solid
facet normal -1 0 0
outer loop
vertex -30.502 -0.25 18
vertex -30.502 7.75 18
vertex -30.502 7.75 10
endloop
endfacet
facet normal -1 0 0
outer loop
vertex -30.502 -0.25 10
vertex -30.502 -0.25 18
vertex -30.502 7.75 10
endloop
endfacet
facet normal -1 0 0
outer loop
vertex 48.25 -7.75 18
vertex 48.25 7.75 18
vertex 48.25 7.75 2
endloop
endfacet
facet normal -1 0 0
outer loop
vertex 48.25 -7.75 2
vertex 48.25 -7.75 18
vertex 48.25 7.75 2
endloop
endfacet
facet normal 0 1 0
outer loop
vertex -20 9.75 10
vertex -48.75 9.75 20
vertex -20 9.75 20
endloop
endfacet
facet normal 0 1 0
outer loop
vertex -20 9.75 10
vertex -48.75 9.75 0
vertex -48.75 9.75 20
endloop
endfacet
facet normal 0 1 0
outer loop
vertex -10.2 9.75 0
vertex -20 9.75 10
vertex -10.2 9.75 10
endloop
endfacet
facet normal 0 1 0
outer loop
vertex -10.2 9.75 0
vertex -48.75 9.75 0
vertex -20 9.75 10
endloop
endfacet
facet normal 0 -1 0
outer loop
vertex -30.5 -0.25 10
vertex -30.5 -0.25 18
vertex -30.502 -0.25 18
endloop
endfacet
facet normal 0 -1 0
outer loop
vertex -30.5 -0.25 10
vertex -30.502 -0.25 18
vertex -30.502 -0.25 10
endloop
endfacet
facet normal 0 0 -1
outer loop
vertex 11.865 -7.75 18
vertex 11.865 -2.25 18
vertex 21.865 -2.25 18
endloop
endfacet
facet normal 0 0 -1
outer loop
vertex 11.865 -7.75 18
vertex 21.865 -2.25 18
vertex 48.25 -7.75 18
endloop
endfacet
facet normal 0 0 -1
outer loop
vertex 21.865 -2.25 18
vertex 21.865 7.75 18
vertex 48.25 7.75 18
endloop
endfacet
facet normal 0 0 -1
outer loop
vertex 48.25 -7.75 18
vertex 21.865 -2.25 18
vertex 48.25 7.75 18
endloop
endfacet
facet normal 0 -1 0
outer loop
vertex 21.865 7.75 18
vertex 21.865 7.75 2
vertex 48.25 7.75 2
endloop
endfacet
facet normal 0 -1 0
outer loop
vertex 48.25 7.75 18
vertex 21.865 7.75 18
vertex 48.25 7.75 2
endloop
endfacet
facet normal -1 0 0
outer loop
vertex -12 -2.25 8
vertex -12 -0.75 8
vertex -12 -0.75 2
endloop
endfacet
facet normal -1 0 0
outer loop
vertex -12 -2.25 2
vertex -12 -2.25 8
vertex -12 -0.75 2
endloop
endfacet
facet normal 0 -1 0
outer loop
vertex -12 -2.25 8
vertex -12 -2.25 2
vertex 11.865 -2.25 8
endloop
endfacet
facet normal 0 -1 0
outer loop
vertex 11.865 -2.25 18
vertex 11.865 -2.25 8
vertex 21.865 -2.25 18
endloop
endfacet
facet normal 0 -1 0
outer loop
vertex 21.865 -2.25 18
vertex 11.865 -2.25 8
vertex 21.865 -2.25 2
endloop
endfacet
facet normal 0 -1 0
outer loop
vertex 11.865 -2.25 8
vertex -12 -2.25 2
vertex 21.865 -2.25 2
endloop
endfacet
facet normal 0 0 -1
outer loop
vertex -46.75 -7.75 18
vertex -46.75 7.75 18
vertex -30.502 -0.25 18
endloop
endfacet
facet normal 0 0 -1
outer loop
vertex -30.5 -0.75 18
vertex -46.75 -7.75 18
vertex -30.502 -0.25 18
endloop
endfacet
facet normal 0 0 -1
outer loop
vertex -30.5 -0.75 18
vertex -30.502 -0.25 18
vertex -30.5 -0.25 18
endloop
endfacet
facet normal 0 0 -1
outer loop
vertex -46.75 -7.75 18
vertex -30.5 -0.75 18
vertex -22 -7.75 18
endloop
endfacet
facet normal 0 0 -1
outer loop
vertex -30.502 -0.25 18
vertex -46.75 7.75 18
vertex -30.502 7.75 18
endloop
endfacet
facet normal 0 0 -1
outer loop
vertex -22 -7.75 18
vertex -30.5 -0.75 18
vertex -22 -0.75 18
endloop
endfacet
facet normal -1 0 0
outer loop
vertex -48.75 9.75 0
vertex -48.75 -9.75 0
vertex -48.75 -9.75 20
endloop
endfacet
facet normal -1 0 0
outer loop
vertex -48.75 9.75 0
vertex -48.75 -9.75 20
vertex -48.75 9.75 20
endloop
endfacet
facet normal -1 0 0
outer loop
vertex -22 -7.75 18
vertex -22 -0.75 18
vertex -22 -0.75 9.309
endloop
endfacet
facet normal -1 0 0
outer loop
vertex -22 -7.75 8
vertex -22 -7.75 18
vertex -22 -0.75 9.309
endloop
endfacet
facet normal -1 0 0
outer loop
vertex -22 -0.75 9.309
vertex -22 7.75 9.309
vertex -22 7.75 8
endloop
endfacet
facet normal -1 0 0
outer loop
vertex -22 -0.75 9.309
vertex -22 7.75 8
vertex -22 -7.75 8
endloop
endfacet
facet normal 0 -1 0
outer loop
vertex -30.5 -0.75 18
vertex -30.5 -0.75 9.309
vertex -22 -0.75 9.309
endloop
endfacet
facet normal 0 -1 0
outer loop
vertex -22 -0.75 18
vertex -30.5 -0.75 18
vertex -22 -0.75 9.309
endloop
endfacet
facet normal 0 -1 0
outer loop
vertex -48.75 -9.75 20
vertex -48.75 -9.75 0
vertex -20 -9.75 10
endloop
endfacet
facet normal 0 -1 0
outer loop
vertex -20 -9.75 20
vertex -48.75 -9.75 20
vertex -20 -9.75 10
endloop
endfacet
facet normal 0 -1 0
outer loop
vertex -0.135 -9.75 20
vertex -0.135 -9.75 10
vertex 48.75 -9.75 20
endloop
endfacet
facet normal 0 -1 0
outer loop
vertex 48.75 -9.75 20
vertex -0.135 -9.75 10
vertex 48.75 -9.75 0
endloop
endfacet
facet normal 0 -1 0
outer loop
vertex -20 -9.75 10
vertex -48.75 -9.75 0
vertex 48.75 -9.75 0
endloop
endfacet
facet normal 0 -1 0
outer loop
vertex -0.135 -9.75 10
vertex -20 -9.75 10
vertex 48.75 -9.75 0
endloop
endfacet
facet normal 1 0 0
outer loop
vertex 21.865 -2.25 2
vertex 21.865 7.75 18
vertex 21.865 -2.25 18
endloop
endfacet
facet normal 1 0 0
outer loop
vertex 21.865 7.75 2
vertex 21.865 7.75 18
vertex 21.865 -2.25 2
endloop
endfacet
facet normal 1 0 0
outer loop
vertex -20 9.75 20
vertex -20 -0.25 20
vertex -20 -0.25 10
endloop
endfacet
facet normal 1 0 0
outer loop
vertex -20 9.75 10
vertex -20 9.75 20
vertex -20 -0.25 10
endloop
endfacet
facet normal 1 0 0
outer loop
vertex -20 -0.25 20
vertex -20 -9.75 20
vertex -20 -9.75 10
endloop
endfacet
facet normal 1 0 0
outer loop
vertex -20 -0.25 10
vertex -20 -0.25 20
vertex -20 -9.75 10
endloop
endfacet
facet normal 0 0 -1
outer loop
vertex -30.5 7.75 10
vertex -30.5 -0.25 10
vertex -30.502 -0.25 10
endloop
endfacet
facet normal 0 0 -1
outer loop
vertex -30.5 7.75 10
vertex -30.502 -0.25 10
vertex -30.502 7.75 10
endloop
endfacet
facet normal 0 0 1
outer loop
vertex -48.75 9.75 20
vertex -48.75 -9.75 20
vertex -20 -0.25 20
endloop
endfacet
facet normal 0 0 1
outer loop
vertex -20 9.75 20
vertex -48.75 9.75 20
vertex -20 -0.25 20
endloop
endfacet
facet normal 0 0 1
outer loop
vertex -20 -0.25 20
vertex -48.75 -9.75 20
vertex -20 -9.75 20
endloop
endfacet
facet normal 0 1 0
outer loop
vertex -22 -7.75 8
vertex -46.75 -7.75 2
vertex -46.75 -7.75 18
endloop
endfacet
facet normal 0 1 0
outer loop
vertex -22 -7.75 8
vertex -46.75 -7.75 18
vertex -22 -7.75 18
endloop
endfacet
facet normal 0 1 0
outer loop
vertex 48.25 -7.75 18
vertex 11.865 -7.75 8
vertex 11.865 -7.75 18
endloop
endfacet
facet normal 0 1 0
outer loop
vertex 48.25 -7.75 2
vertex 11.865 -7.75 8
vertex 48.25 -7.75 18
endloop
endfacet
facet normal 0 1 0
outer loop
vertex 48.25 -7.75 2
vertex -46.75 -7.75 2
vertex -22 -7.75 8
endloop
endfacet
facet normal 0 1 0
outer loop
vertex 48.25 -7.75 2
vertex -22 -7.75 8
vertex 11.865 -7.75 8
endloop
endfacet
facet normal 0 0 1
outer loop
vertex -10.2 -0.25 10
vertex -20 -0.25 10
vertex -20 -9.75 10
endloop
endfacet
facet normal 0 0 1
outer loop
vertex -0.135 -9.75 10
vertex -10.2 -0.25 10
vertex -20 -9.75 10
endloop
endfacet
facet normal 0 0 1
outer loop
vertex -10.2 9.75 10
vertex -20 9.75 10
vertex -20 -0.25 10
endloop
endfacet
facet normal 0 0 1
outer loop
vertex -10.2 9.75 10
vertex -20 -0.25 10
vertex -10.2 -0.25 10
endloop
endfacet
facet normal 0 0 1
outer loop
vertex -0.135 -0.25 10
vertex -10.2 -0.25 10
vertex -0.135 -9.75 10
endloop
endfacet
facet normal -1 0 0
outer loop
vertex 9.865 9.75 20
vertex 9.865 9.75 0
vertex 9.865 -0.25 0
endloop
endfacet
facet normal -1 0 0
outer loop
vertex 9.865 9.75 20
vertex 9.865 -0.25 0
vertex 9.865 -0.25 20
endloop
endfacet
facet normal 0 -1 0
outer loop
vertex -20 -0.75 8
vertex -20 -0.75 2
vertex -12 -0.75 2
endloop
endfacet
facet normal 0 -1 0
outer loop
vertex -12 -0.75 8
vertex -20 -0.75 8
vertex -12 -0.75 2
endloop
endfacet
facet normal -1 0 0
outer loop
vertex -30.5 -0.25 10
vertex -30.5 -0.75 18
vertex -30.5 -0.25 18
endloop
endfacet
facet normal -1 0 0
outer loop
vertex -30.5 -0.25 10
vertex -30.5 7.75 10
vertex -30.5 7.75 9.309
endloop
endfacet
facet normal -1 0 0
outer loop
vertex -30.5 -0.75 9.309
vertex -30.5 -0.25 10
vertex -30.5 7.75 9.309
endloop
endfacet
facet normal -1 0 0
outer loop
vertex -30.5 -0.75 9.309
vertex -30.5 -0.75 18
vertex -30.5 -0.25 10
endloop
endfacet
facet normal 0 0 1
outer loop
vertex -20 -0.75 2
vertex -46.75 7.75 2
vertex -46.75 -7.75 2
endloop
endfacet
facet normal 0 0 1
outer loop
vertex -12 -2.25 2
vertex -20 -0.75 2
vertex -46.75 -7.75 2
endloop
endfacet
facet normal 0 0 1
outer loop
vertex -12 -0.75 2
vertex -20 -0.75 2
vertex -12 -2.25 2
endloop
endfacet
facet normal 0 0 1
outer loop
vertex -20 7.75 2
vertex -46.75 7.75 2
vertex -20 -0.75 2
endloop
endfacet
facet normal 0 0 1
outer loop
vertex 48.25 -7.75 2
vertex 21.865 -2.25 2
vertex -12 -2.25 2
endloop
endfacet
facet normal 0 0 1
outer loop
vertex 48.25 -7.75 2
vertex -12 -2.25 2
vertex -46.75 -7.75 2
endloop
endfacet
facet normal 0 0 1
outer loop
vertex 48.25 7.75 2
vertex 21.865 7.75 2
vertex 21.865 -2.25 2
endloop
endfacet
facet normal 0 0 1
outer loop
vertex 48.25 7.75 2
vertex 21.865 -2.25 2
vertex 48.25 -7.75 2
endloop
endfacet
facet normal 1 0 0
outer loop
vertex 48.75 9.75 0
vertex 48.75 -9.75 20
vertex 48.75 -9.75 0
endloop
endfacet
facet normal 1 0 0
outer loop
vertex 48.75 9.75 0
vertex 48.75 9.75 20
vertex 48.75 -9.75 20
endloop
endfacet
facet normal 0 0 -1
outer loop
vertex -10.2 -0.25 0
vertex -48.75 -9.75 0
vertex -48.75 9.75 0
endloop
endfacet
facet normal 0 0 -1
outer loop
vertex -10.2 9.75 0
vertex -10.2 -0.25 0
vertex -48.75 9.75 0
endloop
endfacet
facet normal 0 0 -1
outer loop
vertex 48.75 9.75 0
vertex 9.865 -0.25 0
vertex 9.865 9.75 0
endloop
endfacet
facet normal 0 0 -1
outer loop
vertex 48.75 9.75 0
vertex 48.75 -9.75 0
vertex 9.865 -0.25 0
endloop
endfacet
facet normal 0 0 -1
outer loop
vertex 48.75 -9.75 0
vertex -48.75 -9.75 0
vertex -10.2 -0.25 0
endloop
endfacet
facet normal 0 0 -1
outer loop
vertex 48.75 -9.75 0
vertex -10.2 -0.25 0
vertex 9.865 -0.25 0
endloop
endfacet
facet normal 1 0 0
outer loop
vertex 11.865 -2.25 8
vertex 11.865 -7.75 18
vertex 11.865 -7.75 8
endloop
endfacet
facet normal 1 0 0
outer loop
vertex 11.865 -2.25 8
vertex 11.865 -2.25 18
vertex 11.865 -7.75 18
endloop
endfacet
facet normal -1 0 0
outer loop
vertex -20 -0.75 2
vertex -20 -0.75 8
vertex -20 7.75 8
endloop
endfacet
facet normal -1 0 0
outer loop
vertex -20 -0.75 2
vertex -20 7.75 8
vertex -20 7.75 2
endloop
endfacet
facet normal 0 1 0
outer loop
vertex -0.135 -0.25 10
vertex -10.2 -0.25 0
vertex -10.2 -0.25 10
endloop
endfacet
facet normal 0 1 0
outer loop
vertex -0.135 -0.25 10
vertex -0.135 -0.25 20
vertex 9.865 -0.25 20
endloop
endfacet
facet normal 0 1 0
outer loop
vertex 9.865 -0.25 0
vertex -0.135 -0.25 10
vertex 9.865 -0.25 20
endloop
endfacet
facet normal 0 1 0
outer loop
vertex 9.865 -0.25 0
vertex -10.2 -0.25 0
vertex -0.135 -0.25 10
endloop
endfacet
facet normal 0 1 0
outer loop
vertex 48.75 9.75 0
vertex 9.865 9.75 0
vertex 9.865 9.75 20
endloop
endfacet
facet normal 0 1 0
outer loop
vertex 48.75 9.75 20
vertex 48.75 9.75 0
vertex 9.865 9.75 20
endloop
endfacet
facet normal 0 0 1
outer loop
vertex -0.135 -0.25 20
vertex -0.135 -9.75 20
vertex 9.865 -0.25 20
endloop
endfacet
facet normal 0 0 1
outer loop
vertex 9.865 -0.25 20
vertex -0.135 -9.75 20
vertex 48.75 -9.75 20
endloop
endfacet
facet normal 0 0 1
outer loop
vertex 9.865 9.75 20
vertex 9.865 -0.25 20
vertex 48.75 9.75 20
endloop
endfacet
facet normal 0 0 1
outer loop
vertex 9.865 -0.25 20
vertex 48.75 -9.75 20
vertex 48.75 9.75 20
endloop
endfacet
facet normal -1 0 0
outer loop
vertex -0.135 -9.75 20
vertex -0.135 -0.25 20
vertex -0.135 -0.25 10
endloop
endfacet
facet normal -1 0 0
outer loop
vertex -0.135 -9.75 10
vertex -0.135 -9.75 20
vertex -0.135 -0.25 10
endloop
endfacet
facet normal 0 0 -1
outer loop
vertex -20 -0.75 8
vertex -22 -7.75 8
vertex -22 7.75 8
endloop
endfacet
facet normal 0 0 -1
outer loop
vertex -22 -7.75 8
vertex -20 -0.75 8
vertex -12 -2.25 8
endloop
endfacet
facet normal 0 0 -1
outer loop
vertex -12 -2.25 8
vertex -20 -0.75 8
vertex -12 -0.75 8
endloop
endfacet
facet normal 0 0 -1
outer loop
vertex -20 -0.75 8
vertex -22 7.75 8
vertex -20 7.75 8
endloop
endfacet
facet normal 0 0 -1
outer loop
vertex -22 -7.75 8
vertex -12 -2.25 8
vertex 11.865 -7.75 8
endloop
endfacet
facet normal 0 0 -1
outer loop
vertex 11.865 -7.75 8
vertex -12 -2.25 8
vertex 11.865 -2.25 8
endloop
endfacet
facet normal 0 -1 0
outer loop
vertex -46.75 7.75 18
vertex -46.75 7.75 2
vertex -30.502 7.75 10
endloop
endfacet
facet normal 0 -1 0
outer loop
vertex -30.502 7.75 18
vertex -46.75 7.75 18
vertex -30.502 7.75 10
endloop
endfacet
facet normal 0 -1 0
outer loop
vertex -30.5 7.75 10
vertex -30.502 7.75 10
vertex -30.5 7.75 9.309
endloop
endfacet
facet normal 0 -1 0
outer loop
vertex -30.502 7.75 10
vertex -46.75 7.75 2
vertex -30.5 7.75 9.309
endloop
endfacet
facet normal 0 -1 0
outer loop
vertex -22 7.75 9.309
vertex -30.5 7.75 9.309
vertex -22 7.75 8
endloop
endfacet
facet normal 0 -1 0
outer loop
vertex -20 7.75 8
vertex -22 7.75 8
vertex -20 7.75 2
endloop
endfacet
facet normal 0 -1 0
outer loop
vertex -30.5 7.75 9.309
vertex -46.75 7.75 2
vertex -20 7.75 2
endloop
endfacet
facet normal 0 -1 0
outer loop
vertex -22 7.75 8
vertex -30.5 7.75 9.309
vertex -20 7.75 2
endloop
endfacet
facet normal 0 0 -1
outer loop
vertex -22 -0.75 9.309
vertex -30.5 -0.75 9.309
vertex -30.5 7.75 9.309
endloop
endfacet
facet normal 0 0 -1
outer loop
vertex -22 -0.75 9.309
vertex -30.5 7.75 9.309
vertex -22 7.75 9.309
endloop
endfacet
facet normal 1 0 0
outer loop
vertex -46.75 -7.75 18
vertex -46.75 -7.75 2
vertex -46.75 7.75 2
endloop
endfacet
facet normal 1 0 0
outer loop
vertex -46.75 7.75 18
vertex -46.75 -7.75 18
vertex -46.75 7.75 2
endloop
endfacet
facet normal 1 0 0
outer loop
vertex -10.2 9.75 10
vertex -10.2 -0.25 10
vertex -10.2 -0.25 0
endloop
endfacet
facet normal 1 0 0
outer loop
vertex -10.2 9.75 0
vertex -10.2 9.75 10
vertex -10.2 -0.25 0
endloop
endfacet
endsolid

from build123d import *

# Parameters (mm, degrees)
SKETCH_1_W           = 97.5
SKETCH_1_H           = 19.5
EXTRUDE_1_DEPTH      = 20
SKETCH_2_W           = 29.8652771
SKETCH_2_H           = 10
CUT_EXTRUDE_4_DEPTH  = 29
SKETCH_3_W           = 10
SKETCH_3_H           = 10
CUT_EXTRUDE_5_DEPTH  = 10
SKETCH_4_W           = 19.8652771
SKETCH_4_H           = 10
CUT_EXTRUDE_6_DEPTH  = 10
SKETCH_5_W           = 10
SKETCH_5_H           = 10
CUT_EXTRUDE_7_DEPTH  = 10
SHELL_1_T            = -2
SKETCH_7_W           = 10
SKETCH_7_H           = 10
CUT_EXTRUDE_8_DEPTH  = 10
SKETCH_8_W           = 10.001998353
SKETCH_8_H           = 10
CUT_EXTRUDE_9_DEPTH  = 10
SKETCH_9_W           = 10
SKETCH_9_H           = 10
EXTRUDE_3_DEPTH      = 10
SKETCH_10_W          = 8.5
SKETCH_10_H          = 8.69149108
EXTRUDE_4_DEPTH      = 0.5
SKETCH_11_W          = 8
SKETCH_11_H          = 8
EXTRUDE_5_DEPTH      = 0.5
SKETCH_15_W          = 10.5
SKETCH_15_H          = 0.69149108
EXTRUDE_18_DEPTH     = 9.5
SKETCH_18_W          = 8
SKETCH_18_H          = 8
EXTRUDE_22_DEPTH     = 0.5
SKETCH_21_W          = 10
SKETCH_21_H          = 0.094242597
EXTRUDE_25_DEPTH     = 10.5
SKETCH_23_W          = 20
SKETCH_23_H          = 10
EXTRUDE_27_DEPTH     = 10
SKETCH_24_W          = 10.001998353
SKETCH_24_H          = 10
EXTRUDE_28_DEPTH     = 10
SKETCH_25_W          = 9.8
SKETCH_25_H          = 10
EXTRUDE_29_DEPTH     = 10
SKETCH_31_W          = 10
SKETCH_31_H          = 0.5
CUT_EXTRUDE_11_DEPTH = 11.5
SKETCH_32_W          = 16
SKETCH_32_H          = 15.5
EXTRUDE_43_DEPTH     = 0.5


with BuildPart() as part:
    # 草圖1 → 填料-伸長1 (new body)
    with BuildSketch(Plane.XY):
        Rectangle(SKETCH_1_W, SKETCH_1_H)
    extrude(amount=EXTRUDE_1_DEPTH)

    # 草圖2 → 除料-伸長4 (cut)
    with BuildSketch(Plane(origin=(0, 9.75, 0), x_dir=(1, 0, 0), z_dir=(0, 1, 0))):
        with Locations((-5.06736145, -15)):
            Rectangle(SKETCH_2_W, SKETCH_2_H)
    extrude(amount=-CUT_EXTRUDE_4_DEPTH, mode=Mode.SUBTRACT)

    # 草圖3 → 除料-伸長5 (cut)
    with BuildSketch(Plane(origin=(0, 9.75, 0), x_dir=(1, 0, 0), z_dir=(0, 1, 0))):
        with Locations((14.8652771, -15)):
            Rectangle(SKETCH_3_W, SKETCH_3_H)
    extrude(amount=-CUT_EXTRUDE_5_DEPTH, mode=Mode.SUBTRACT)

    # 草圖4 → 除料-伸長6 (cut)
    with BuildSketch(Plane(origin=(0, 9.75, 0), x_dir=(1, 0, 0), z_dir=(0, 1, 0))):
        with Locations((9.93263855, -5)):
            Rectangle(SKETCH_4_W, SKETCH_4_H)
    extrude(amount=-CUT_EXTRUDE_6_DEPTH, mode=Mode.SUBTRACT)

    # 草圖5 → 除料-伸長7 (cut)
    with BuildSketch(Plane(origin=(0, 9.75, 0), x_dir=(1, 0, 0), z_dir=(0, 1, 0))):
        with Locations((-5, -5)):
            Rectangle(SKETCH_5_W, SKETCH_5_H)
    extrude(amount=-CUT_EXTRUDE_7_DEPTH, mode=Mode.SUBTRACT)

    # 薄殼1
    shell_1_openings = [part.faces().sort_by_distance(p)[0] for p in [
        (48.75, 0, 10),
    ]]
    offset(amount=SHELL_1_T, openings=shell_1_openings, kind=Kind.INTERSECTION)

    # 草圖7 → 除料-伸長8 (cut)
    with BuildSketch(Plane(origin=(0, 9.75, 0), x_dir=(1, 0, 0), z_dir=(0, 1, 0))):
        with Locations((-15, -5)):
            Rectangle(SKETCH_7_W, SKETCH_7_H)
    extrude(amount=-CUT_EXTRUDE_8_DEPTH, mode=Mode.SUBTRACT)

    # 草圖8 → 除料-伸長9 (cut)
    with BuildSketch(Plane(origin=(0, 9.75, 0), x_dir=(1, 0, 0), z_dir=(0, 1, 0))):
        with Locations((-25.000999177, -15)):
            Rectangle(SKETCH_8_W, SKETCH_8_H)
    extrude(amount=-CUT_EXTRUDE_9_DEPTH, mode=Mode.SUBTRACT)

    # 草圖9 → 填料-伸長3 (add)
    with BuildSketch(Plane(origin=(0, -0.25, 0), x_dir=(1, 0, 0), z_dir=(0, 1, 0))):
        with Locations((4.8652771, -15)):
            Rectangle(SKETCH_9_W, SKETCH_9_H)
    extrude(amount=-EXTRUDE_3_DEPTH)

    # 草圖10 → 填料-伸長4 (add)
    with BuildSketch(Plane(origin=(0, -0.25, 0), x_dir=(1, 0, 0), z_dir=(0, 1, 0))):
        with Locations((-26.25, -13.65425446)):
            Rectangle(SKETCH_10_W, SKETCH_10_H)
    extrude(amount=-EXTRUDE_4_DEPTH)

    # 草圖11 → 填料-伸長5 (add)
    with BuildSketch(Plane(origin=(-30.001998353, 0, 0), x_dir=(0, 0, -1), z_dir=(1, 0, 0))):
        with Locations((-14, 3.75)):
            Rectangle(SKETCH_11_W, SKETCH_11_H)
    extrude(amount=-EXTRUDE_5_DEPTH)

    # 草圖15 → 填料-伸長18 (add)
    with BuildSketch(Plane(origin=(0, -0.25, 0), x_dir=(1, 0, 0), z_dir=(0, 1, 0))):
        with Locations((-25.25, -9.65425446)):
            Rectangle(SKETCH_15_W, SKETCH_15_H)
    extrude(amount=EXTRUDE_18_DEPTH)

    # 草圖18 → 填料-伸長22 (add)
    with BuildSketch(Plane(origin=(0, -0.25, 0), x_dir=(1, 0, 0), z_dir=(0, 1, 0))):
        with Locations((-16, -6)):
            Rectangle(SKETCH_18_W, SKETCH_18_H)
    extrude(amount=-EXTRUDE_22_DEPTH)

    # 草圖21 → 填料-伸長25 (add)
    with BuildSketch(Plane(origin=(-20, 0, 0), x_dir=(0, 0, -1), z_dir=(1, 0, 0))):
        with Locations((-5, -0.297121299)):
            Rectangle(SKETCH_21_W, SKETCH_21_H)
    extrude(amount=EXTRUDE_25_DEPTH)

    # 草圖23 → 填料-伸長27 (add)
    with BuildSketch(Plane.ZY.offset(-19.8652771)):
        with Locations((10, 4.75)):
            Rectangle(SKETCH_23_W, SKETCH_23_H)
    extrude(amount=EXTRUDE_27_DEPTH)

    # 草圖24 → 填料-伸長28 (add)
    with BuildSketch(Plane(origin=(0, -0.25, 0), x_dir=(1, 0, 0), z_dir=(0, 1, 0))):
        with Locations((-25.000999177, -15)):
            Rectangle(SKETCH_24_W, SKETCH_24_H)
    extrude(amount=EXTRUDE_28_DEPTH)

    # 草圖25 → 填料-伸長29 (add)
    with BuildSketch(Plane(origin=(0, -0.25, 0), x_dir=(1, 0, 0), z_dir=(0, 1, 0))):
        with Locations((-15.1, -5)):
            Rectangle(SKETCH_25_W, SKETCH_25_H)
    extrude(amount=EXTRUDE_29_DEPTH)

    # 草圖31 → 除料-伸長11 (cut)
    with BuildSketch(Plane(origin=(9.8652771, 0, 0), x_dir=(0, 0, -1), z_dir=(1, 0, 0))):
        with Locations((-15, -10)):
            Rectangle(SKETCH_31_W, SKETCH_31_H)
    extrude(amount=-CUT_EXTRUDE_11_DEPTH, mode=Mode.SUBTRACT)

    # 草圖32 → 填料-伸長43 (add)
    with BuildSketch(Plane(origin=(48.75, 0, 0), x_dir=(0, 0, -1), z_dir=(1, 0, 0))):
        with Locations((-10, 0)):
            Rectangle(SKETCH_32_W, SKETCH_32_H)
    extrude(amount=-EXTRUDE_43_DEPTH)


solid = part.part
